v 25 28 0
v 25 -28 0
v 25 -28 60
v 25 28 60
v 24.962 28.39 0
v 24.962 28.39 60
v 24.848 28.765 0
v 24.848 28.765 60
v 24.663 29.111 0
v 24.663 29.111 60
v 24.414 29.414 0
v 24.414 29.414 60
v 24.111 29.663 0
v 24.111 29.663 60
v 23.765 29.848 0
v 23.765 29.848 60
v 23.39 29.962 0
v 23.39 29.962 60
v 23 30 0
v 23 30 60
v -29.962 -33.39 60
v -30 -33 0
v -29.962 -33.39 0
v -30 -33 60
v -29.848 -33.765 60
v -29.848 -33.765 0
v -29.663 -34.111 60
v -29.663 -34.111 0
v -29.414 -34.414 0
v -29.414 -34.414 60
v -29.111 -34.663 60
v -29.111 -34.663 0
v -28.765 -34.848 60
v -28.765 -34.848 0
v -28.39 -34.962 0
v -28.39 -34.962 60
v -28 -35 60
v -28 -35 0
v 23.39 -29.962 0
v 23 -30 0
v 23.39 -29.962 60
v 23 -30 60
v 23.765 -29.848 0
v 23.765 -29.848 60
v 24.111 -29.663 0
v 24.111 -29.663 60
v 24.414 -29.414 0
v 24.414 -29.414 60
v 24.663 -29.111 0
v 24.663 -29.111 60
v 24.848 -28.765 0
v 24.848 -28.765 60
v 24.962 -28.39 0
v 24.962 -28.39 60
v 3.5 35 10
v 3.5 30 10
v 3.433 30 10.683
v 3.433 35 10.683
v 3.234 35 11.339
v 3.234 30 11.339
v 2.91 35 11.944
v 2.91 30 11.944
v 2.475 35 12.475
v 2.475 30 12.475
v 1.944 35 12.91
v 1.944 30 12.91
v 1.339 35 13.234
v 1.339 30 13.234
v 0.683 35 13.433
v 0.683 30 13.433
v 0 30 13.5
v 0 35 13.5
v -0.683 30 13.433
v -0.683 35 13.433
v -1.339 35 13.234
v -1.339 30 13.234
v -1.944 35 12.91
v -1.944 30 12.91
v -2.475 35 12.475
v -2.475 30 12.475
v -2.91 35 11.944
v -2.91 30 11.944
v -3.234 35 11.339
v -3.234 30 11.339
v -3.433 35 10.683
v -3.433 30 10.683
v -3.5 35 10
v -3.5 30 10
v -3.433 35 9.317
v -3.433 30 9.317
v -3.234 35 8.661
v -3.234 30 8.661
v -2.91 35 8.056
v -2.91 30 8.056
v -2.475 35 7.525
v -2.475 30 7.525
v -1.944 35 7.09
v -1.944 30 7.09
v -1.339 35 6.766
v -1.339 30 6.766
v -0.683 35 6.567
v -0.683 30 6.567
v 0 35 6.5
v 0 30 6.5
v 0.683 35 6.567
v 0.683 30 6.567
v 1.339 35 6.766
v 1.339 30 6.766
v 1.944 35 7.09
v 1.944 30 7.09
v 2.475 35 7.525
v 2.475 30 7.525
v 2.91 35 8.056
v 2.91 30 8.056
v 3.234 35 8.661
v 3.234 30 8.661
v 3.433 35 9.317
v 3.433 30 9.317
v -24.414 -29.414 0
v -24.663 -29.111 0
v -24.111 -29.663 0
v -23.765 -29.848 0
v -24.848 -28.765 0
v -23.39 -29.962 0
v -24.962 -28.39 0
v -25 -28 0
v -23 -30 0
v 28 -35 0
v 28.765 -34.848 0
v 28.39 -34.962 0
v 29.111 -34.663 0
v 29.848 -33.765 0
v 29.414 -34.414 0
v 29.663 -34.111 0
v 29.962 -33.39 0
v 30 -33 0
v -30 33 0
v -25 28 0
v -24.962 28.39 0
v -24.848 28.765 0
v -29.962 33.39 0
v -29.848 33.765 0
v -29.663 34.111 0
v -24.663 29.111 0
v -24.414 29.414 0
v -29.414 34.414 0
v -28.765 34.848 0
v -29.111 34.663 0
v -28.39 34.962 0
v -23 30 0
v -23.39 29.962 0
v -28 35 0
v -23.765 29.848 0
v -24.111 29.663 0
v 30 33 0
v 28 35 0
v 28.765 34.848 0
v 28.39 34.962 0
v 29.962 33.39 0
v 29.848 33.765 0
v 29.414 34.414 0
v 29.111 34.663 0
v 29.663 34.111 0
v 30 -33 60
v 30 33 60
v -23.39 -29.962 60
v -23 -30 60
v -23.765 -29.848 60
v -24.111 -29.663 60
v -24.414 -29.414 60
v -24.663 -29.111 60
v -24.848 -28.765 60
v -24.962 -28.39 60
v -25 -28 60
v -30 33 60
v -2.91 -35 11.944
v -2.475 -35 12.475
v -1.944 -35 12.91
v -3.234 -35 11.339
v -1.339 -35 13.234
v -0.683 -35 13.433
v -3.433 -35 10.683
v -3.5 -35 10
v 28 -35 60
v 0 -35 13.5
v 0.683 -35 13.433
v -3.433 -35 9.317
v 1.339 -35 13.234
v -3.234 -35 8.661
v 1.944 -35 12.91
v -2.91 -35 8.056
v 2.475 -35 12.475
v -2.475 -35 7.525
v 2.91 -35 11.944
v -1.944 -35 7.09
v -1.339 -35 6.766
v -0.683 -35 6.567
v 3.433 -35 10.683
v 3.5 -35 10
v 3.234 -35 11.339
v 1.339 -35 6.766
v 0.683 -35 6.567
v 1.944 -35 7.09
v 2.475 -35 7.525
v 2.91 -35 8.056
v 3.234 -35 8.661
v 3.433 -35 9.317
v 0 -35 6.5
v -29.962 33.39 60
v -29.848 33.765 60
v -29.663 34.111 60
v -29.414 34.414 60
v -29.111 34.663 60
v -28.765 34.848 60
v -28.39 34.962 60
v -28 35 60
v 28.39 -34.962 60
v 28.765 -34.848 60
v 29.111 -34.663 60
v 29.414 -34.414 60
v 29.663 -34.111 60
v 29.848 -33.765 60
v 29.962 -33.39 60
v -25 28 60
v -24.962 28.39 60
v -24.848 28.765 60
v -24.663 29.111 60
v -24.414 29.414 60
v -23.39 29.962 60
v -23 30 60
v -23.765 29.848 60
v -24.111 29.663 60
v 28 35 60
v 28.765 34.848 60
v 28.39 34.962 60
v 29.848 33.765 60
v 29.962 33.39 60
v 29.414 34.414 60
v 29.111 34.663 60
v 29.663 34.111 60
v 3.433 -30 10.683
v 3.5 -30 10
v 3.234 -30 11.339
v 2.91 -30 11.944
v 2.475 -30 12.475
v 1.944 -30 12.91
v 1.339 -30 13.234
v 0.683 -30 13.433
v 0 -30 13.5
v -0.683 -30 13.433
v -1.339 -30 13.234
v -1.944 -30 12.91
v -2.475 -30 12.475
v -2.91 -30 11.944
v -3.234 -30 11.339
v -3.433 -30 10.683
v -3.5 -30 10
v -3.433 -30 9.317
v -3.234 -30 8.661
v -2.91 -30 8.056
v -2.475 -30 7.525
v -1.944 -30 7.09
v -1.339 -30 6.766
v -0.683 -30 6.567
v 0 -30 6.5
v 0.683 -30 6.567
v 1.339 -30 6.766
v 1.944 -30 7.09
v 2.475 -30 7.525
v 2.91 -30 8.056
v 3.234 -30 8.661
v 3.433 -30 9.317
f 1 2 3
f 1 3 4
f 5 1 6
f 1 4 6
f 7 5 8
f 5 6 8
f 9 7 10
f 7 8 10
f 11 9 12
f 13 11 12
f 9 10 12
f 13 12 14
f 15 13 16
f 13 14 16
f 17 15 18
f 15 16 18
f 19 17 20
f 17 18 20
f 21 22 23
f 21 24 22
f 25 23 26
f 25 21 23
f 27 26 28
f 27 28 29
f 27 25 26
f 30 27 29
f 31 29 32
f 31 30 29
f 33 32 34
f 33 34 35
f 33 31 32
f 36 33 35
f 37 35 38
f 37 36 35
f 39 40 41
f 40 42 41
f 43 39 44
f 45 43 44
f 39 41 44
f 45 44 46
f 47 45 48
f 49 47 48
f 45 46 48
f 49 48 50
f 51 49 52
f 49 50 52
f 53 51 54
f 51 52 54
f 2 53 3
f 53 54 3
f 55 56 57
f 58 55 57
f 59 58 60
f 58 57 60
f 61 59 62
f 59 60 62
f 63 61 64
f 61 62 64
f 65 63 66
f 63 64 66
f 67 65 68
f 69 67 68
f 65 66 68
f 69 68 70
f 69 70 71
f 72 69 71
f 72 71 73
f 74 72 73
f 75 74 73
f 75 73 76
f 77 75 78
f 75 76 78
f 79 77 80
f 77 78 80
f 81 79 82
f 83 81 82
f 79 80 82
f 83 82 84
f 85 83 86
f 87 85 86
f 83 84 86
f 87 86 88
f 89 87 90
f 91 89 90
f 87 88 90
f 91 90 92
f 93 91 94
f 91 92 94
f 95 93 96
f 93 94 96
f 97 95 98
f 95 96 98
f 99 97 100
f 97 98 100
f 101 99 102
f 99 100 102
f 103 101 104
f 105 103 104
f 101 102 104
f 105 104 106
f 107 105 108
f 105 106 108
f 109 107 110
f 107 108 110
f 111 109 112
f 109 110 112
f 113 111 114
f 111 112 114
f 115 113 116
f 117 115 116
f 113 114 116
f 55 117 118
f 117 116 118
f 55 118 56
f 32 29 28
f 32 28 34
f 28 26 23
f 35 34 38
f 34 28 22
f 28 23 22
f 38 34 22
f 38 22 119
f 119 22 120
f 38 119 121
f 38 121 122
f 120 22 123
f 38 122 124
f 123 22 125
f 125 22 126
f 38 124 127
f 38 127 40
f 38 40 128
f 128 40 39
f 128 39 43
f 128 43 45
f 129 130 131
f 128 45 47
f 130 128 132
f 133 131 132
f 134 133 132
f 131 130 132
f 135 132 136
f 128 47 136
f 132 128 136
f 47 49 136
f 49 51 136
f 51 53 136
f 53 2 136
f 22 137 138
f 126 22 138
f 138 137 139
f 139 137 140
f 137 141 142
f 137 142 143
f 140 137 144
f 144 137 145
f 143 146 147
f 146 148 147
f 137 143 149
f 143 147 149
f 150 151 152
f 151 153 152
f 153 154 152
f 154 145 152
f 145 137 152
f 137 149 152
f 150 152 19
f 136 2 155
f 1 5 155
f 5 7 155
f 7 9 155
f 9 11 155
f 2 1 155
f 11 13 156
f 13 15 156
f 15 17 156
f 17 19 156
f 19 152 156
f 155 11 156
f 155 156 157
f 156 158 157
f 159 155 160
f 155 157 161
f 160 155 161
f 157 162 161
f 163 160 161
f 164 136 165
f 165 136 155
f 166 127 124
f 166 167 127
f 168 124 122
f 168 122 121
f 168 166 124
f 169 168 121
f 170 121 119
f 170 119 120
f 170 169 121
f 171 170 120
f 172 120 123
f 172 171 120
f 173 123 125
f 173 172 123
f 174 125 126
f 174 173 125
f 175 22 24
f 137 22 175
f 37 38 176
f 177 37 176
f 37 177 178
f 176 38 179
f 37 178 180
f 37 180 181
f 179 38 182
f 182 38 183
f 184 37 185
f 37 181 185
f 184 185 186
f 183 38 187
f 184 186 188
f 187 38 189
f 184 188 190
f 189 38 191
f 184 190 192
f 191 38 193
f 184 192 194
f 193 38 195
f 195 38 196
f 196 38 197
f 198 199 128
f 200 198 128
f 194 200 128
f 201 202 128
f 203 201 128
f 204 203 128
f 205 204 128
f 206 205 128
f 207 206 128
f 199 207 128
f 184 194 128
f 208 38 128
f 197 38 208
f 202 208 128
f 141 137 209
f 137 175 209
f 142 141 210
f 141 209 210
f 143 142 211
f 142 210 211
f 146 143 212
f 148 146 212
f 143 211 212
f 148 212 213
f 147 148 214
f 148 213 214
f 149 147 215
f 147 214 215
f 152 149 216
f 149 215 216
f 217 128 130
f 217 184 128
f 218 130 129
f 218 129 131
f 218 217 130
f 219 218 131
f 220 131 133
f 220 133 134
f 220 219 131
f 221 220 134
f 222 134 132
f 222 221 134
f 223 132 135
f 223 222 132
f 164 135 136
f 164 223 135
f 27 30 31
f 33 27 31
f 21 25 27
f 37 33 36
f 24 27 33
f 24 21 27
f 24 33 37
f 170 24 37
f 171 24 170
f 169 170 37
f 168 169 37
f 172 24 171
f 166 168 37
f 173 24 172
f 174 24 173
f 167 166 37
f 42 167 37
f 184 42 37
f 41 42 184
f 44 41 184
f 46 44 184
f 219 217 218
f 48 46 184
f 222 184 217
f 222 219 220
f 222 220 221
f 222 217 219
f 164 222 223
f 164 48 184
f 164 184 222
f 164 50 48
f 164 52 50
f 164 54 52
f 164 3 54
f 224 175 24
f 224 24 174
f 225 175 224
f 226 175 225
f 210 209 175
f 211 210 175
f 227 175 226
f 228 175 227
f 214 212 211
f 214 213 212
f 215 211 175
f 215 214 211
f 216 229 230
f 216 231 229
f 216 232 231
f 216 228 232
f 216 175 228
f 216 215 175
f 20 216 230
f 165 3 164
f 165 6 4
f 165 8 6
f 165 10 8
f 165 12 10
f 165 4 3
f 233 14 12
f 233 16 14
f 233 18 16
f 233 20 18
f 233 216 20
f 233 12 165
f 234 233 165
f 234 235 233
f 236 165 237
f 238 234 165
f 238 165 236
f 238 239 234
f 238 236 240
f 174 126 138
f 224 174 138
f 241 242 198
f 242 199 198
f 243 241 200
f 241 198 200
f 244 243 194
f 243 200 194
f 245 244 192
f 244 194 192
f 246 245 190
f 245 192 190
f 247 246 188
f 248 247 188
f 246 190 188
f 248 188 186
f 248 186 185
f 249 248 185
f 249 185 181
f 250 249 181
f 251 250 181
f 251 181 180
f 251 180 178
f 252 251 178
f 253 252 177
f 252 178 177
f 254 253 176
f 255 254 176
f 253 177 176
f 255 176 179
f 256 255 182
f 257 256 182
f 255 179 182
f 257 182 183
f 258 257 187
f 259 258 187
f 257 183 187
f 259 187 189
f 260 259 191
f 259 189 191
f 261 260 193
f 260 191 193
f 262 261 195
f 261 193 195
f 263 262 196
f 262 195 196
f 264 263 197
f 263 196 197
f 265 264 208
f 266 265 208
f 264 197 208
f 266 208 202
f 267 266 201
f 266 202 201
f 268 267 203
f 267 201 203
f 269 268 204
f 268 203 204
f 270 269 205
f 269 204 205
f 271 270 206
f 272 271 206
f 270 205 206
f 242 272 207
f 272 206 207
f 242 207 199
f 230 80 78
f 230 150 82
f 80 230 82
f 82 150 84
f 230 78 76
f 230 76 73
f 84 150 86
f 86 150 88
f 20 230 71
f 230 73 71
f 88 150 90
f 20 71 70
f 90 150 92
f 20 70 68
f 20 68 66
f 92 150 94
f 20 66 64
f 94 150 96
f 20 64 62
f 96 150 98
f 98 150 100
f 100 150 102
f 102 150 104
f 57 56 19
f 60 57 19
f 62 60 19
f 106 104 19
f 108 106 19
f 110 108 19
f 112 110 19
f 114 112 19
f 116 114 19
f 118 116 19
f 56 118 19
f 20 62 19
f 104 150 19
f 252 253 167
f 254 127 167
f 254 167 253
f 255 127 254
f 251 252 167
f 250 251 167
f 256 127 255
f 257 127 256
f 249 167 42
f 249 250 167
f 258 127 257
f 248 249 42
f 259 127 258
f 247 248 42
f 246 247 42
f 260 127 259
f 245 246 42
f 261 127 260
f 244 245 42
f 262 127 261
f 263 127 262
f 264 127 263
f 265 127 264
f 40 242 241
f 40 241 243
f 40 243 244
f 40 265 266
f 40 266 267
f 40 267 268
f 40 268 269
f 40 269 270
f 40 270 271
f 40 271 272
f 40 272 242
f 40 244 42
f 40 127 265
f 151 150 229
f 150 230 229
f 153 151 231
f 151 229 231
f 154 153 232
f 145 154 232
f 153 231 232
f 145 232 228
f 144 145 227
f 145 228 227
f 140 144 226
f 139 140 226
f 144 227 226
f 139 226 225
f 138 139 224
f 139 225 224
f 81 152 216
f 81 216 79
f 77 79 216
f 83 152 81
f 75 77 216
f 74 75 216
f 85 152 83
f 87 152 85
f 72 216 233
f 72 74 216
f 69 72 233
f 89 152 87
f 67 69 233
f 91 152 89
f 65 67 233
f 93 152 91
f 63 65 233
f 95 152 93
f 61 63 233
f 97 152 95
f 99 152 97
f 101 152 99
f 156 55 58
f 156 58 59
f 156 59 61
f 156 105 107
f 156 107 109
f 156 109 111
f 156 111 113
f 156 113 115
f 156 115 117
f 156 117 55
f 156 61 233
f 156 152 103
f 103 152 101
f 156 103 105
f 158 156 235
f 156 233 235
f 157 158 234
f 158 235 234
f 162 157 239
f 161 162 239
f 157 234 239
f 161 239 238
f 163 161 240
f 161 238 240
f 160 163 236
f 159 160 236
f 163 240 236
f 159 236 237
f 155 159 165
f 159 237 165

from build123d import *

# Parameters (mm, degrees)
F0_W     = 60
F0_H     = 70
F0_W_2   = 50
F0_H_2   = 60
F1_DEPTH = 60
F2_R     = 2
F3_R     = 3.5
F4_DEPTH = 35


with BuildPart() as f1:
    # F0 (on Top) → F1 (new body)
    with BuildSketch(Plane.XY):
        Rectangle(F0_W, F0_H)
        Rectangle(F0_W_2, F0_H_2, mode=Mode.SUBTRACT)
    extrude(amount=F1_DEPTH)

    # F2
    f2_edges = [f1.edges().sort_by_distance(p)[0] for p in [
        (-30, -35, 30),
        (30, -35, 30),
        (-30, 35, 30),
        (30, 35, 30),
        (25, -30, 30),
        (-25, 30, 30),
        (25, 30, 30),
        (-25, -30, 30),
    ]]
    fillet(f2_edges, radius=F2_R)

    # F3 (on Front) → F4 (cut, symmetric)
    with BuildSketch(Plane.XZ):
        with Locations((0, 10)):
            Circle(F3_R)
    extrude(amount=F4_DEPTH, both=True, mode=Mode.SUBTRACT)


solid = f1.part
